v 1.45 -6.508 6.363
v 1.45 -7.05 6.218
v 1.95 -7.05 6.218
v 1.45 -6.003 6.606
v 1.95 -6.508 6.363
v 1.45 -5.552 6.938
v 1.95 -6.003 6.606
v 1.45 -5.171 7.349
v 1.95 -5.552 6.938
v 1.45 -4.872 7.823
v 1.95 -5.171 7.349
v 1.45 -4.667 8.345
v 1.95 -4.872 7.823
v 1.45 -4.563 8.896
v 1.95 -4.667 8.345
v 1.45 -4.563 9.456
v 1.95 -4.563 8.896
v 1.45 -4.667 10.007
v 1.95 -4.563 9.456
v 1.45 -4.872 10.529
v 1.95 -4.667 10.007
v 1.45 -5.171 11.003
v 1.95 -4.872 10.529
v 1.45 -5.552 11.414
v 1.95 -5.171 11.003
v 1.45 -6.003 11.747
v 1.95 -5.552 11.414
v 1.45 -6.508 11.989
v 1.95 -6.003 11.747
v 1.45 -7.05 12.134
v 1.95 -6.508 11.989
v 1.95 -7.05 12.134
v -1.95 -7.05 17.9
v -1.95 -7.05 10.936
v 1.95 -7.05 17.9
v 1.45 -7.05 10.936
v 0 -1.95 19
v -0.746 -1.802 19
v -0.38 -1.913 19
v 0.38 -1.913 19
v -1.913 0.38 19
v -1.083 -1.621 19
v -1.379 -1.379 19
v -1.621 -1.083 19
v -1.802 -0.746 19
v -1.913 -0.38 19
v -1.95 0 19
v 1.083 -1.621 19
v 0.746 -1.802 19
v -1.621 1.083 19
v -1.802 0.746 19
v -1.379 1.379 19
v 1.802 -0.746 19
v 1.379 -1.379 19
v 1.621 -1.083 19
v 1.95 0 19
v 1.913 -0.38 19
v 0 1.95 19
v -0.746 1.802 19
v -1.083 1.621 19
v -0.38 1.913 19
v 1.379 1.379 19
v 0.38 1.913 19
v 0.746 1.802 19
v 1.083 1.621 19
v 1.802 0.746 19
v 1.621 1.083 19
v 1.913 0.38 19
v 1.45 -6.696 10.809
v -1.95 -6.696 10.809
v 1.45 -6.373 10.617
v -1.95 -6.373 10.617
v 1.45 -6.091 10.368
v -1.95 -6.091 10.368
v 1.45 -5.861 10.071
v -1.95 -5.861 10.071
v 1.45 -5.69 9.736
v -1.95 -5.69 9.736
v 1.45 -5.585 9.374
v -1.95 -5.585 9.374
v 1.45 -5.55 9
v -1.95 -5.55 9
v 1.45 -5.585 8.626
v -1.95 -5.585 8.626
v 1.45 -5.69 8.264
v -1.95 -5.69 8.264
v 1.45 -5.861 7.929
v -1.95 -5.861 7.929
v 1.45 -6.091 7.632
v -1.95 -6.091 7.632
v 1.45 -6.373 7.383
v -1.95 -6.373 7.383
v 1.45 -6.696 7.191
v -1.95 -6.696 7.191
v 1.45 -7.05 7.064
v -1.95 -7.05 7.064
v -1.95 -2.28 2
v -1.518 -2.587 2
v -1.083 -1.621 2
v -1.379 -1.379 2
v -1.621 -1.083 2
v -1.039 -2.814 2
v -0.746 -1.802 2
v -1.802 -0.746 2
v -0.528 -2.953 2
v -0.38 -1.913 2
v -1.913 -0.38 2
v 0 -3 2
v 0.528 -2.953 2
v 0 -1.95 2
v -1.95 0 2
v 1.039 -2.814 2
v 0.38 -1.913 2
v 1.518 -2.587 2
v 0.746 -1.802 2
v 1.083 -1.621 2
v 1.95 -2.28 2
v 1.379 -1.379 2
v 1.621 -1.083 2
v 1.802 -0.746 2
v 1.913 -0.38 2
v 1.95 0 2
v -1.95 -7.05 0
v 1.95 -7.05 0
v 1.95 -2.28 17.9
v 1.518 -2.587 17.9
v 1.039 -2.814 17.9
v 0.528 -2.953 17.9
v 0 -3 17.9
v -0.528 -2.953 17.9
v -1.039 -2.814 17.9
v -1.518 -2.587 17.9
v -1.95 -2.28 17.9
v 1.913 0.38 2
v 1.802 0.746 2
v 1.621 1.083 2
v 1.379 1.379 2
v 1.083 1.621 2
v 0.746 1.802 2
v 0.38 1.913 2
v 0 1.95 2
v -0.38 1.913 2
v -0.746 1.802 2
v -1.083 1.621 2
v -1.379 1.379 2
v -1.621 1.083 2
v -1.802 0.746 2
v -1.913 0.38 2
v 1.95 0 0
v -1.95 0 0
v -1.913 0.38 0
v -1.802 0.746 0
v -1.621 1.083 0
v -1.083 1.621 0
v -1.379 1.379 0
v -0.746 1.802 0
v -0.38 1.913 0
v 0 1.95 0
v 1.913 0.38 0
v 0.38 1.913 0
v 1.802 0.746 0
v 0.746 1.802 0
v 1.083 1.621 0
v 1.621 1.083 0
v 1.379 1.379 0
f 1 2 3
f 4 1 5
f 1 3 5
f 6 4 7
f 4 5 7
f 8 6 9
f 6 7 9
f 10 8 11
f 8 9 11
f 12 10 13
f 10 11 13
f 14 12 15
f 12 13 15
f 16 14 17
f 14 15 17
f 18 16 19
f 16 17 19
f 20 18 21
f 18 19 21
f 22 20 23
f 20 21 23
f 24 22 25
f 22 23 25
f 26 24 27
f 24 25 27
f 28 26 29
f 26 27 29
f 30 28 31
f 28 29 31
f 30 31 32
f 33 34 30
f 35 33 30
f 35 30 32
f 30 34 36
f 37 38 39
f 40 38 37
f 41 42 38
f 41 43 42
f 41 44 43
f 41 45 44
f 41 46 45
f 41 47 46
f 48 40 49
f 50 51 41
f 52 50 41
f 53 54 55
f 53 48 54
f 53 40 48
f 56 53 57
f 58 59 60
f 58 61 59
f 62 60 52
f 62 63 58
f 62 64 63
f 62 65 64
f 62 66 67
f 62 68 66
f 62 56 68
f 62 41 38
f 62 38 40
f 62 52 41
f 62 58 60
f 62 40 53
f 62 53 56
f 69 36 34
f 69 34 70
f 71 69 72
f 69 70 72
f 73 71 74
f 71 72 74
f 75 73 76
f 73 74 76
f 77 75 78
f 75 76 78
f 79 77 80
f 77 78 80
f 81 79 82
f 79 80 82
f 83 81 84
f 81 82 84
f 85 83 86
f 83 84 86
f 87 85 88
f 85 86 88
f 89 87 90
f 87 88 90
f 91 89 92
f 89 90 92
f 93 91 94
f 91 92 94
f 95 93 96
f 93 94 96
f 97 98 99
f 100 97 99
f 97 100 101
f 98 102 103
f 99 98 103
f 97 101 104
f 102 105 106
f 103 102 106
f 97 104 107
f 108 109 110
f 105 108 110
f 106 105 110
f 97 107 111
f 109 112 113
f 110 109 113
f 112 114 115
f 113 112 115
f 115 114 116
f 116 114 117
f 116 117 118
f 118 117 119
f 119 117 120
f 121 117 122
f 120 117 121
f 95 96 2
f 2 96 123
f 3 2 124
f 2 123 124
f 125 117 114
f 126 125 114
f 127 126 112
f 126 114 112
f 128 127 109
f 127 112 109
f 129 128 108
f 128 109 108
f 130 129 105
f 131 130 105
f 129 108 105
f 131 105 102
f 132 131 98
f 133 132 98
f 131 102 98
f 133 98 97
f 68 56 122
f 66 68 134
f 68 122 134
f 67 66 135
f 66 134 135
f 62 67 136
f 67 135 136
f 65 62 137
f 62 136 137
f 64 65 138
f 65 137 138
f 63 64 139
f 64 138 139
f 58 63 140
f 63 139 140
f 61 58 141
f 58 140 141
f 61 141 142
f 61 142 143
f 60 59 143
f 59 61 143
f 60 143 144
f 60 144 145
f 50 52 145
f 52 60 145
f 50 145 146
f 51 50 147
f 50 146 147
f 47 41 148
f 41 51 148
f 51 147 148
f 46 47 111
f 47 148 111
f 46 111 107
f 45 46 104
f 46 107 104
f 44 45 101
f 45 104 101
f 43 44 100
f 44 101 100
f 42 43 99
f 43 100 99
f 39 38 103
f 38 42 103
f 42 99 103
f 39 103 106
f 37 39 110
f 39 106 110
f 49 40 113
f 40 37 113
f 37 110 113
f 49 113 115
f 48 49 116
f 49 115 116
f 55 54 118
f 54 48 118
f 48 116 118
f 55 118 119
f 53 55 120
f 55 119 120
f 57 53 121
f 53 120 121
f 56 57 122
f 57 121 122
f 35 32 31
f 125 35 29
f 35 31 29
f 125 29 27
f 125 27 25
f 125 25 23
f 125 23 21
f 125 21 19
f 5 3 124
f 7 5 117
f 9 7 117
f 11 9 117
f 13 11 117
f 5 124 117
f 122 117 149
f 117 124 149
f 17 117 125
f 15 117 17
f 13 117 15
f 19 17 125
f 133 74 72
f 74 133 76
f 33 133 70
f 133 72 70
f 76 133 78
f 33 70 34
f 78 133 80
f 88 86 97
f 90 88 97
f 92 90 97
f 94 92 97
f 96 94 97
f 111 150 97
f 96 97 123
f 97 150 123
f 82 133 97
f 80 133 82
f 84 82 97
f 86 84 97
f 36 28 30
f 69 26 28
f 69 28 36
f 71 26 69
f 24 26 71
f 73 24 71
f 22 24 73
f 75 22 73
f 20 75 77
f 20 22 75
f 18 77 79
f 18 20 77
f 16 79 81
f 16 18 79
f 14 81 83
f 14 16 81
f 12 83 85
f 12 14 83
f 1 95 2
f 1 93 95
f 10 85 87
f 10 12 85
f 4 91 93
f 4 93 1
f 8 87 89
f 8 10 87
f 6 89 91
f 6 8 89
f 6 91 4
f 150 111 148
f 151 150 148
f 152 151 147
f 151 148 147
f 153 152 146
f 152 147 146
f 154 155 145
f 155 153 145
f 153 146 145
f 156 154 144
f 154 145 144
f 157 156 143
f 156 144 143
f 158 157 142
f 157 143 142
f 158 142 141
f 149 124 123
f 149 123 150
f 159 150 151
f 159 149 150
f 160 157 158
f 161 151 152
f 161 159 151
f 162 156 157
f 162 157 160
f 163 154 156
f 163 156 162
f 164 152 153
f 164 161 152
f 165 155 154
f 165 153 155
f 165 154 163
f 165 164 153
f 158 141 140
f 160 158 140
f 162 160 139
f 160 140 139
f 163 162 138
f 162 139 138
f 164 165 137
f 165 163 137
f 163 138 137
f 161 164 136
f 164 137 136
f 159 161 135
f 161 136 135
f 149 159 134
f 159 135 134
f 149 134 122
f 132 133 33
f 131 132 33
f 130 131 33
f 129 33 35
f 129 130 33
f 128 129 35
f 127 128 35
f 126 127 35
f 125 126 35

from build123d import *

# Parameters (mm, degrees)
SKETCH_1_R          = 1.95
EXTRUDE_1_DEPTH     = 19
SKETCH_4_W          = 2
SKETCH_4_H          = 9
EXTRUDE_2_DEPTH     = 1.95
CUT_EXTRUDE_1_DEPTH = 21.359396
EXTRUDE_4_DEPTH     = 15.9
SKETCH_9_R          = 2
CUT_EXTRUDE_2_DEPTH = 17
SKETCH_11_R         = 3
CUT_EXTRUDE_4_DEPTH = 0.5


with BuildPart() as part:
    # 스케치1 → 보스-돌출1 (new body)
    with BuildSketch(Plane.XY):
        Circle(SKETCH_1_R)
    extrude(amount=EXTRUDE_1_DEPTH)

    # 스케치4 → 보스-돌출2 (add, symmetric)
    with BuildSketch(Plane(origin=(0, 0, 0), x_dir=(0, 0, -1), z_dir=(1, 0, 0))):
        with Locations((-1, -2.55)):
            Rectangle(SKETCH_4_W, SKETCH_4_H)
    extrude(amount=EXTRUDE_2_DEPTH, both=True)

    # 스케치5 → 컷-돌출1 (cut, through all)
    with BuildSketch(Plane.XY.offset(19)):
        with BuildLine():
            Line((-1.95, 1.95), (-1.95, 0))
            ThreePointArc((-1.95, 0), (-1.378858, 1.378858), (0, 1.95))
            Line((0, 1.95), (-1.95, 1.95))
        make_face()
        with BuildLine():
            ThreePointArc((0, 1.95), (1.378858, 1.378858), (1.95, 0))
            Line((1.95, 0), (1.95, 1.95))
            Line((1.95, 1.95), (0, 1.95))
        make_face()
    extrude(amount=-CUT_EXTRUDE_1_DEPTH, mode=Mode.SUBTRACT)

    # 스케치8 → 보스-돌출4 (add)
    with BuildSketch(Plane.XY.offset(2)):
        with BuildLine():
            ThreePointArc((1.95, -2.279803), (0, -3), (-1.95, -2.279803))
            Line((-1.95, -2.279803), (-1.95, -7.05))
            Line((-1.95, -7.05), (1.95, -7.05))
            Line((1.95, -7.05), (1.95, -2.279803))
        make_face()
    extrude(amount=EXTRUDE_4_DEPTH)

    # 스케치9 → 컷-돌출2 (cut)
    with BuildSketch(Plane.ZY.offset(1.95)):
        with Locations((9, -7.55)):
            Circle(SKETCH_9_R)
    extrude(amount=-CUT_EXTRUDE_2_DEPTH, mode=Mode.SUBTRACT)

    # 스케치11 → 컷-돌출4 (cut)
    with BuildSketch(Plane(origin=(1.95, 0, 0), x_dir=(0, 0, -1), z_dir=(1, 0, 0))):
        with Locations((-9.176059, -7.55)):
            Circle(SKETCH_11_R)
    extrude(amount=-CUT_EXTRUDE_4_DEPTH, mode=Mode.SUBTRACT)


solid = part.part
